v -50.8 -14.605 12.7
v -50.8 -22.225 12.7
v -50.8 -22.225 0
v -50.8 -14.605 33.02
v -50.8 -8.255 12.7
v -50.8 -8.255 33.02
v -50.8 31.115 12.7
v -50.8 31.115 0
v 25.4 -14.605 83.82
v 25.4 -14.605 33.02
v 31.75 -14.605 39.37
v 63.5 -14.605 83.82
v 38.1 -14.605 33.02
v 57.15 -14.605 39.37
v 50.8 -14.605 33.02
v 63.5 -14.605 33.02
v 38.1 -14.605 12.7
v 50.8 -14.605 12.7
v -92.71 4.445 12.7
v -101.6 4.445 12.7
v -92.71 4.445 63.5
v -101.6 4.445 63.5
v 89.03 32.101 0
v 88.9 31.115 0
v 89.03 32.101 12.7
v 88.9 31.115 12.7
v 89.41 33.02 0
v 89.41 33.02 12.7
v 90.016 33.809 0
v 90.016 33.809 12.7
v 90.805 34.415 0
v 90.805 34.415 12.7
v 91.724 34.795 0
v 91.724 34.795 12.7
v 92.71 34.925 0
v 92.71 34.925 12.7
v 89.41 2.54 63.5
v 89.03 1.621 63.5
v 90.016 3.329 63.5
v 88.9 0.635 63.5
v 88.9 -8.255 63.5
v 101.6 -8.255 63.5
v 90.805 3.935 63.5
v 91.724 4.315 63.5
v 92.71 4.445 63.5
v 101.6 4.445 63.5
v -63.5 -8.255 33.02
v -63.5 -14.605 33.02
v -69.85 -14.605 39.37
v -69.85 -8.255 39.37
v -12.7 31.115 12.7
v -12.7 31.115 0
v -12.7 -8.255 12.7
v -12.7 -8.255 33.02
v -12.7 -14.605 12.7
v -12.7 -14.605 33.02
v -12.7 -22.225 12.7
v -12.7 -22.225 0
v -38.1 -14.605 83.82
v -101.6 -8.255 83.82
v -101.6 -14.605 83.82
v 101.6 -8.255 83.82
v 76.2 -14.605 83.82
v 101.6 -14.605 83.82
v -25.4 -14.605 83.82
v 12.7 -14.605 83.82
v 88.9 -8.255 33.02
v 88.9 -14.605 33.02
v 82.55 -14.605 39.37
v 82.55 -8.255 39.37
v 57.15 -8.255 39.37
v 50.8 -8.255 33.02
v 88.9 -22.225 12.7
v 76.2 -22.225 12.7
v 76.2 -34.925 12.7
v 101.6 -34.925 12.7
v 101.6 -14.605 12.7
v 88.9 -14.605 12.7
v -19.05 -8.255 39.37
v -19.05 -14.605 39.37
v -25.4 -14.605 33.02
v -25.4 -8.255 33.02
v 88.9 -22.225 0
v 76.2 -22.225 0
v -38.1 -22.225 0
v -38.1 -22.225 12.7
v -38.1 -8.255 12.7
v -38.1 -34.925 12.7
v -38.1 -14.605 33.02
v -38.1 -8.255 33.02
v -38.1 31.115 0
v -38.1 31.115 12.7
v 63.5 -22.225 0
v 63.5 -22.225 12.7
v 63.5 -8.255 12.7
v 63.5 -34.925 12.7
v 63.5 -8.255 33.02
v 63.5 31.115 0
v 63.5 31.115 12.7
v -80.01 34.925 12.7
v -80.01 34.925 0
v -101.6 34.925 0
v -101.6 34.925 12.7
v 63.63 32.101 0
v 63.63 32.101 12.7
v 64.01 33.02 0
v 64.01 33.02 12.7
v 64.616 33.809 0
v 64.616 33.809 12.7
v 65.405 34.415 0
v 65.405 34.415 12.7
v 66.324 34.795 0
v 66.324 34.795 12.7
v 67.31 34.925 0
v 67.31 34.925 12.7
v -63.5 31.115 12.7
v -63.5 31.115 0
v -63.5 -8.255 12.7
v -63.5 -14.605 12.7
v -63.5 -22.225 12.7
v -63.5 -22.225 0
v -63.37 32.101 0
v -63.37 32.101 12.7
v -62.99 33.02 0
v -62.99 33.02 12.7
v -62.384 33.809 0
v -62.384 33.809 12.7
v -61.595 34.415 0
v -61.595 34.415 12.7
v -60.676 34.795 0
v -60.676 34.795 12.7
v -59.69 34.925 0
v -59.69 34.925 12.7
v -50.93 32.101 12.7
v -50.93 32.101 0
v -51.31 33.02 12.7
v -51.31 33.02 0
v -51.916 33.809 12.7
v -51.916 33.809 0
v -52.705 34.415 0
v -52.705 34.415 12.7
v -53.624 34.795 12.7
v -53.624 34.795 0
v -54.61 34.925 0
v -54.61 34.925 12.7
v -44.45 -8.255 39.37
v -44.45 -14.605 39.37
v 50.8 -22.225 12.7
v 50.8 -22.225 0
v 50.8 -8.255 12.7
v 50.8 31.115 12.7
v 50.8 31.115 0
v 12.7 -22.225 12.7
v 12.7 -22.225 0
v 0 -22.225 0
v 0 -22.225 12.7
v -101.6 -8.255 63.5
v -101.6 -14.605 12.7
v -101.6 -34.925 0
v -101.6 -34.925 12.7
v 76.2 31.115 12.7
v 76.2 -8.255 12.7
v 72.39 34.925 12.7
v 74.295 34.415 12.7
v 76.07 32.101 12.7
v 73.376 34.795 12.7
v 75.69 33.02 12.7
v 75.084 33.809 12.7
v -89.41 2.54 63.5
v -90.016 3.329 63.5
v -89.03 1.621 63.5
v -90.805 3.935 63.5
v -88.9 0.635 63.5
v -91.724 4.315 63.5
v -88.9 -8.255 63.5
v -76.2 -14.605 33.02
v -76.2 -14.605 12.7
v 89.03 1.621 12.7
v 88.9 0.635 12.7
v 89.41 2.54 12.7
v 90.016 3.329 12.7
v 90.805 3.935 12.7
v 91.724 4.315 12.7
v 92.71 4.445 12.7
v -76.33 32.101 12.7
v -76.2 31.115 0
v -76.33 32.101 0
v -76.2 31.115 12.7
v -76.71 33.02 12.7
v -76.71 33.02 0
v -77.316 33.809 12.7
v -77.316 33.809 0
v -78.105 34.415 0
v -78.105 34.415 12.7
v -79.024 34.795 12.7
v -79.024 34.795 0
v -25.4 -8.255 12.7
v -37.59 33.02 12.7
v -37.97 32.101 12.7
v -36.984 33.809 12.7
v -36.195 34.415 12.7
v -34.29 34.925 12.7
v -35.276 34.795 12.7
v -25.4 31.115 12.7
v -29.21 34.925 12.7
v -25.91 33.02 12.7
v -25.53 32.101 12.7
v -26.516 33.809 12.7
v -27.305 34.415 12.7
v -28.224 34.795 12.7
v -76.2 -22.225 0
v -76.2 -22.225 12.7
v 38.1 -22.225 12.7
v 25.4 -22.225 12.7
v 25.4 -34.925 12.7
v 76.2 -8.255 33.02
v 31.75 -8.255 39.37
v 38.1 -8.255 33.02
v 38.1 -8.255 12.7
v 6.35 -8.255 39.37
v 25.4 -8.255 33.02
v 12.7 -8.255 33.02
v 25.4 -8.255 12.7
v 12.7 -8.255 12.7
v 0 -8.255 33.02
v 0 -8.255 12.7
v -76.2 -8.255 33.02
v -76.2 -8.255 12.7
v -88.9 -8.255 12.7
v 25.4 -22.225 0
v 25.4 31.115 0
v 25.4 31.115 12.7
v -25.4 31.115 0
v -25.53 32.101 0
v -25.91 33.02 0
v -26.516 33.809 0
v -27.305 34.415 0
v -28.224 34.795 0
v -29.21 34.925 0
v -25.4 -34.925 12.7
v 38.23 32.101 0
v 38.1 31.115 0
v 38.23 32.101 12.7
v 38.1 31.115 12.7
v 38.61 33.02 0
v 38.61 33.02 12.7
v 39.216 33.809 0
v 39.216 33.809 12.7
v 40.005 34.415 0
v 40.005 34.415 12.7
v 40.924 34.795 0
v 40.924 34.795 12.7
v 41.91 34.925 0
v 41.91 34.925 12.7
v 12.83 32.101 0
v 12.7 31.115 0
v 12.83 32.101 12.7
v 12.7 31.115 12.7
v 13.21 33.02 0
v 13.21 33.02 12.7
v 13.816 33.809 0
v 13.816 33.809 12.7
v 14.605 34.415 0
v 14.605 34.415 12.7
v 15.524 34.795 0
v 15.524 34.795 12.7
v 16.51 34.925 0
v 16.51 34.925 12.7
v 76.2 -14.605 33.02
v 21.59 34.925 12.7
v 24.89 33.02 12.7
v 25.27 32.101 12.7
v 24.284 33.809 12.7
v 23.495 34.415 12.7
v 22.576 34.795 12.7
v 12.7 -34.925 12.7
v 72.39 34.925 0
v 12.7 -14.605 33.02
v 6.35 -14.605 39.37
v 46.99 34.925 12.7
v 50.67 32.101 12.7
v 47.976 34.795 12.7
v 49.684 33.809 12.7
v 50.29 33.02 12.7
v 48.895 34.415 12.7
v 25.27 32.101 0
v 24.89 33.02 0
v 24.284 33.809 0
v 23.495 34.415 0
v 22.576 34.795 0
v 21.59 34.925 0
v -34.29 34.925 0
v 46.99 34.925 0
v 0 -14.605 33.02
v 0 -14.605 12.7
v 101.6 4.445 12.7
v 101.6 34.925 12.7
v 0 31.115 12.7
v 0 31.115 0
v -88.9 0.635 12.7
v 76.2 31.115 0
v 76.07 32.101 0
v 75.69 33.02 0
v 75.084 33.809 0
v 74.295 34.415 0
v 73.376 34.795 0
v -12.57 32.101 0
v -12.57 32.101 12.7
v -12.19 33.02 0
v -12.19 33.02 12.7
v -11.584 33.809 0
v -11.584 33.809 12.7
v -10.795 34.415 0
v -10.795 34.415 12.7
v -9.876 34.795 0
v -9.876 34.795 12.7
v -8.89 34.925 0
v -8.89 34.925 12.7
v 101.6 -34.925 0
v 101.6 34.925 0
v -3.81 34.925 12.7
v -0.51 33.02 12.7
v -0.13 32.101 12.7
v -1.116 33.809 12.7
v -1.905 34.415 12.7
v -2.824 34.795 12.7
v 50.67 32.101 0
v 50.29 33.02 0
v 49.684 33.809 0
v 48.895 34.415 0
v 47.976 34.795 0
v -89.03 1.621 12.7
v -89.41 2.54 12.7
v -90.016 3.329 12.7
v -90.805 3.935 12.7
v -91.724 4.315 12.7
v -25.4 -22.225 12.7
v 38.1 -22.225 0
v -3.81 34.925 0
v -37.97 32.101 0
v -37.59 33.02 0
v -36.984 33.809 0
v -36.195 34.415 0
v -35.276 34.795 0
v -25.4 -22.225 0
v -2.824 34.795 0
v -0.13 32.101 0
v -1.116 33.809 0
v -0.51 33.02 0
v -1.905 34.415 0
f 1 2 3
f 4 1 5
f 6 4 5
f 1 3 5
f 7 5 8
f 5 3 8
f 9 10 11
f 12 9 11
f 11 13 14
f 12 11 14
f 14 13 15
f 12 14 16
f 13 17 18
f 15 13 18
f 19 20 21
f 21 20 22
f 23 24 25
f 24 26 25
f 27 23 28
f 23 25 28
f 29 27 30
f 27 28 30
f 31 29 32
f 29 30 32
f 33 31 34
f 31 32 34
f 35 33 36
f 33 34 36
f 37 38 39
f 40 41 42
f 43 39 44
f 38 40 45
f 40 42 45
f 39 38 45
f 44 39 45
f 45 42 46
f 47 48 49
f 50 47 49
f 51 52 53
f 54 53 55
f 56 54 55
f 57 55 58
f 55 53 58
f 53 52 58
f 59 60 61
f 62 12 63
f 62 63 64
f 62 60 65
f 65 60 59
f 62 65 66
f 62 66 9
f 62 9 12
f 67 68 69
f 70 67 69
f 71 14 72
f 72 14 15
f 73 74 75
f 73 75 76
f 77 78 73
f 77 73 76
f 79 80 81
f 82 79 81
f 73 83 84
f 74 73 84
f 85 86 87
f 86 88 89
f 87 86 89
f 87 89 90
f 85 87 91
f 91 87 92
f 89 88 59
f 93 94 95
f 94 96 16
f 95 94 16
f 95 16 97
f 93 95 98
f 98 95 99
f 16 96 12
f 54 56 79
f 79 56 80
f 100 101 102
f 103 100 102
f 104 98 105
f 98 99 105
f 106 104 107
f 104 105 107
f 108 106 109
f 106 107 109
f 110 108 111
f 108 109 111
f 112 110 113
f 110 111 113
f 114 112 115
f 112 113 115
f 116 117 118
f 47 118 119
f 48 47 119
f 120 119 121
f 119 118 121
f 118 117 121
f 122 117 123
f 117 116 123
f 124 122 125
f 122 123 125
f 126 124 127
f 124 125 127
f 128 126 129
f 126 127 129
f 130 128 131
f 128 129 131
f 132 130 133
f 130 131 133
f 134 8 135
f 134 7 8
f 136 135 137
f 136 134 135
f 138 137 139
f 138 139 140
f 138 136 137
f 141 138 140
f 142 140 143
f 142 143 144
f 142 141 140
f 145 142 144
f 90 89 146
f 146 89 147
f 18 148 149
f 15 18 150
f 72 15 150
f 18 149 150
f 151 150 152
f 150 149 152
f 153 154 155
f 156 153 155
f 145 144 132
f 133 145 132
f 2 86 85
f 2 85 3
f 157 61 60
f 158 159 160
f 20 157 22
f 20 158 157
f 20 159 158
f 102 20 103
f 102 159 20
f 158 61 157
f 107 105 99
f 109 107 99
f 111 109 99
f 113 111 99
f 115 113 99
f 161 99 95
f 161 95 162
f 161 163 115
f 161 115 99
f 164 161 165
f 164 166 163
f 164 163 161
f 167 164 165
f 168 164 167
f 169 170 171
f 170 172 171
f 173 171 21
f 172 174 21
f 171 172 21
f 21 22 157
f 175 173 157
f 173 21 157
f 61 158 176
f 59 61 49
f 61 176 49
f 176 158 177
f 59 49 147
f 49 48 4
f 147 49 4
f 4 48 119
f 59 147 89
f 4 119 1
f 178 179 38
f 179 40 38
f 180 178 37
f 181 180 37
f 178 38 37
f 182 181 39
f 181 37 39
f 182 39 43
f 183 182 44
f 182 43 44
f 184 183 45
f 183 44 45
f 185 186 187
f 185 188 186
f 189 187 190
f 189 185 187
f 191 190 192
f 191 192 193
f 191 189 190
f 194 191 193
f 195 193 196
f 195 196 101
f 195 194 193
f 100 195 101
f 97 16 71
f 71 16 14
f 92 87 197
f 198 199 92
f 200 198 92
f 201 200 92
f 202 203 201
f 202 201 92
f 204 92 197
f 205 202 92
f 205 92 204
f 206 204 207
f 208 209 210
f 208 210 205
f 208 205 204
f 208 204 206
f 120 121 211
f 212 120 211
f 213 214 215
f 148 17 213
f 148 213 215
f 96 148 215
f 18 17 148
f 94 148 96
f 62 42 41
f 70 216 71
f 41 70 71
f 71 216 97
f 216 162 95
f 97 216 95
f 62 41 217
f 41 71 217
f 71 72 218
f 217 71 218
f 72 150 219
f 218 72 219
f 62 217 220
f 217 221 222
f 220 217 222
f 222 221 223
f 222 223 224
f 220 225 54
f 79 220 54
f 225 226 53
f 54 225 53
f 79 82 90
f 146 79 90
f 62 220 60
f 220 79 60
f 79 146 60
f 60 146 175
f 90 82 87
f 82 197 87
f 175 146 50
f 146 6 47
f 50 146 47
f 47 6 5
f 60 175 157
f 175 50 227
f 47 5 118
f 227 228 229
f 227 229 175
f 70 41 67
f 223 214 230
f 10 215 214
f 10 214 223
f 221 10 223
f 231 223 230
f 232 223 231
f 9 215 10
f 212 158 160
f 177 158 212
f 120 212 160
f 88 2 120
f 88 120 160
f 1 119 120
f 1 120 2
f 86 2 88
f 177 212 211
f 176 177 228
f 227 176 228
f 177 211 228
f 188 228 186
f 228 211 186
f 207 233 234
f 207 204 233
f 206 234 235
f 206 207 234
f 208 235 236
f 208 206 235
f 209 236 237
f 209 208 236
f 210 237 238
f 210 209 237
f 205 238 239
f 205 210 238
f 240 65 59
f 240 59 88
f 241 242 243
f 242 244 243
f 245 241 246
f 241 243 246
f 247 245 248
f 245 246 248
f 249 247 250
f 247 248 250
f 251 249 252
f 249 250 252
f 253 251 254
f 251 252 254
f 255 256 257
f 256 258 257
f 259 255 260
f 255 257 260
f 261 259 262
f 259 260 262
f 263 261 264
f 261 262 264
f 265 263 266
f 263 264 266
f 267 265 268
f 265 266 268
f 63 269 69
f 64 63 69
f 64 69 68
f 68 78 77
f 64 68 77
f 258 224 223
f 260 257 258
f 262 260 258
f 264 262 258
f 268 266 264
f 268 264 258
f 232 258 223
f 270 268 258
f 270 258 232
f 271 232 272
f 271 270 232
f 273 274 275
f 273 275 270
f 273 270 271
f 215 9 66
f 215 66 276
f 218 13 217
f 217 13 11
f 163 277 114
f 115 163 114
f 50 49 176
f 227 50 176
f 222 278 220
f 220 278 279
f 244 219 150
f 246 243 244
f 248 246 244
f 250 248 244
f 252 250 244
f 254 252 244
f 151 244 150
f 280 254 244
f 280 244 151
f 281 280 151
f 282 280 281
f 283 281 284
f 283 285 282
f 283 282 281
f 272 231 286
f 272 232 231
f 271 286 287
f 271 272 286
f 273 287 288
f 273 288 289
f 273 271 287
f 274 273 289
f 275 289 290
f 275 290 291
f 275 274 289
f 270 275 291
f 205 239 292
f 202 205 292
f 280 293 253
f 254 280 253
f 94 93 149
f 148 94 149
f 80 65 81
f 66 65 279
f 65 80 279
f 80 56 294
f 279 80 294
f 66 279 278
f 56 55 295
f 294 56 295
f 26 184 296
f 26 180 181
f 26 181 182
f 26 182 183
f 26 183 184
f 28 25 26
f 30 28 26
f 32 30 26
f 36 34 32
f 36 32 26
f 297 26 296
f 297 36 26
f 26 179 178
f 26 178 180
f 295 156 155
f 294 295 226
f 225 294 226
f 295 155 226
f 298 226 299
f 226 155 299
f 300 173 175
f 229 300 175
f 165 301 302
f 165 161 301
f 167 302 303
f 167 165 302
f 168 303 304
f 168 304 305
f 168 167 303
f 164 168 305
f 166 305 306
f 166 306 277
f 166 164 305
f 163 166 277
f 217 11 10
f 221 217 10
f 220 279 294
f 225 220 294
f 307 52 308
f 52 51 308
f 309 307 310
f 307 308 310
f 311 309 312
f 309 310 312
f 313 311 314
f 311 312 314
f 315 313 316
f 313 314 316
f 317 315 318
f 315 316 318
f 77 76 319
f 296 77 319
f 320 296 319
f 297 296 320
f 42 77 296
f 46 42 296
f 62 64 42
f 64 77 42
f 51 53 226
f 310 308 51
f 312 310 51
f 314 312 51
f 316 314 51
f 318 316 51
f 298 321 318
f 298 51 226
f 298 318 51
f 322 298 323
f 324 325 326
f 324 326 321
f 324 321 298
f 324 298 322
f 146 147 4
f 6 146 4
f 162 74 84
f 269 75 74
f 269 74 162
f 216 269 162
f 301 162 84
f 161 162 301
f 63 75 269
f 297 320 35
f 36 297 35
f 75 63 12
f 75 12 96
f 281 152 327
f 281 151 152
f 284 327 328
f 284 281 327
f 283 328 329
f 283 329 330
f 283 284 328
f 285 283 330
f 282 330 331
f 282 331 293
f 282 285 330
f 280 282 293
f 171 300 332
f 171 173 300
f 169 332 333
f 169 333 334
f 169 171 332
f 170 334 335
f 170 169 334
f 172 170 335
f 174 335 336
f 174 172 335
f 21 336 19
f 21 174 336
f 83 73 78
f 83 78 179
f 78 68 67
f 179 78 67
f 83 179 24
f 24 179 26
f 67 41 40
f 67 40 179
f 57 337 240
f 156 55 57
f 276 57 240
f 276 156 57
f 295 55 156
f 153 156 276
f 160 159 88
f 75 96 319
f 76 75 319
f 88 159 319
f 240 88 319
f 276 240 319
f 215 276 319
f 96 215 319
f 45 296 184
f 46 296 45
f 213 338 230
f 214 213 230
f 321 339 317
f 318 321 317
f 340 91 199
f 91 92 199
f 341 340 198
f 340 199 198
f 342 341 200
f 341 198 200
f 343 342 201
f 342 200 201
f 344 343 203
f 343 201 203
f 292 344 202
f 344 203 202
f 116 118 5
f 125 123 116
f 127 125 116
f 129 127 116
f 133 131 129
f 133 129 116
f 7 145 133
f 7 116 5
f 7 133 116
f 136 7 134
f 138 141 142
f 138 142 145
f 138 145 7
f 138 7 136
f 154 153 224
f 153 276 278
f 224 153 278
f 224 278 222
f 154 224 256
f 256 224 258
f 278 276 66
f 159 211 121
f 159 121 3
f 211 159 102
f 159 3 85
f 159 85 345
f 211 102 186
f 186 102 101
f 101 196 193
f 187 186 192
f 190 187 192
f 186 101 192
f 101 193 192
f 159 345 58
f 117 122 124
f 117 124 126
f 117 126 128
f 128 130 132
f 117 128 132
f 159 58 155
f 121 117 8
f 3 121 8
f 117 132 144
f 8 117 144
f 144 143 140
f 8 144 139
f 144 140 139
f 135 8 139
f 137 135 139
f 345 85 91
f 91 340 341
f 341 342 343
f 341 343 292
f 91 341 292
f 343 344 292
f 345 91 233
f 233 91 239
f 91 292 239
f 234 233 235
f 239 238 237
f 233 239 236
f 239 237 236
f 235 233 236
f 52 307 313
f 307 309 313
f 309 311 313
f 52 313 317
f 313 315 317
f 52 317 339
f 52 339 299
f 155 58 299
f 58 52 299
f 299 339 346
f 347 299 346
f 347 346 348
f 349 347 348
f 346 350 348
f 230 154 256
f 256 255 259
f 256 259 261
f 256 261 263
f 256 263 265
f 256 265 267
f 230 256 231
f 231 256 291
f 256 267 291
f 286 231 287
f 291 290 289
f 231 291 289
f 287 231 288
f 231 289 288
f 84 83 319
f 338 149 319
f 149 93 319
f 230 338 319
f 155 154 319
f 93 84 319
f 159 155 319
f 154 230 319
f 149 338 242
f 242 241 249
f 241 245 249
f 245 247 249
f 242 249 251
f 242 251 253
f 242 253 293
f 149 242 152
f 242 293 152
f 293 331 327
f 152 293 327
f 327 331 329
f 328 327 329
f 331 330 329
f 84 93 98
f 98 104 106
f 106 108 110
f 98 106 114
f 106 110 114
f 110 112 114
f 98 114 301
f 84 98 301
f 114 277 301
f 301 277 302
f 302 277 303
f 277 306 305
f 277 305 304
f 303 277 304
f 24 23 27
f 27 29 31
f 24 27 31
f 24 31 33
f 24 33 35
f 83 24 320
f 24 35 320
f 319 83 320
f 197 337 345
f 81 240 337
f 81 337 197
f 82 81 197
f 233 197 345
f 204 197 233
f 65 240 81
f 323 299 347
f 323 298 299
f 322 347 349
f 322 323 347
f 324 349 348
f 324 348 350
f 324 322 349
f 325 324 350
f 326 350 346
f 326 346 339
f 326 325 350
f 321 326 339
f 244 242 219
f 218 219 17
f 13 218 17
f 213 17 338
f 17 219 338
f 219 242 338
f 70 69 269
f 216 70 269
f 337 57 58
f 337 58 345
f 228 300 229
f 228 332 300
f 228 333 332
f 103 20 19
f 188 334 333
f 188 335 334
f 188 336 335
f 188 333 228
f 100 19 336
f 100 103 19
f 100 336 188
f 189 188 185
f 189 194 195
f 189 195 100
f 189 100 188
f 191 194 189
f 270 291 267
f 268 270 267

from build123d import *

# Parameters (mm, degrees)
F0_W      = 12.7
F0_H      = 57.15
F1_DEPTH  = 12.7
F2_W      = 25.4
F2_H      = 6.35
F2_W_2    = 12.7
F3_DEPTH  = 20.32
F4_W      = 25.4
F4_H      = 6.35
F4_W_2    = 12.7
F5_DEPTH  = 50.8
F6_W      = 12.7
F6_H      = 50.8
F7_DEPTH  = 12.7
F9_DEPTH  = 12.7
F11_DEPTH = 12.7
F13_DEPTH = 12.7
F14_W     = 12.7
F14_H     = 50.8
F15_DEPTH = 12.7
F16_R     = 3.81
F18_DEPTH = 6.35
F19_R     = 3.81


# Not quite as in the source:
# - a feature names something its author has since deleted; it is built from what else it names


with BuildPart() as f1:
    # F0 (on Top) → F1 (new body)
    with BuildSketch(Plane.XY):
        Polygon((101.6, -34.925), (101.6, 34.925), (88.9, 34.925), (88.9, -22.225), (76.2, -22.225), (76.2, 34.925), (63.5, 34.925), (63.5, -22.225), (50.8, -22.225), (50.8, 34.925), (38.1, 34.925), (38.1, -22.225), (25.4, -22.225), (25.4, 34.925), (12.7, 34.925), (12.7, -22.225), (0, -22.225), (0, 34.925), (-12.7, 34.925), (-12.7, -22.225), (-25.4, -22.225), (-25.4, 34.925), (-38.1, 34.925), (-38.1, -22.225), (-50.8, -22.225), (-50.8, 34.925), (-63.5, 34.925), (-63.5, -22.225), (-76.2, -22.225), (-76.2, 34.925), (-88.9, 34.925), (-88.9, -22.225), (-101.6, -22.225), (-101.6, -34.925), align=None)
        with Locations((-95.25, 6.35)):
            Rectangle(F0_W, F0_H)
    extrude(amount=F1_DEPTH)

    # F2 (on face) → F3 (join)
    with BuildSketch(Plane.XY.offset(12.7)):
        with Locations((-88.9, -11.43)):
            Rectangle(F2_W, F2_H)
        with Locations((-31.75, -11.43)):
            Rectangle(F2_W_2, F2_H)
        with Locations((-6.35, -11.43)):
            Rectangle(F2_W_2, F2_H)
        with Locations((19.05, -11.43)):
            Rectangle(F2_W_2, F2_H)
        with Locations((44.45, -11.43)):
            Rectangle(F2_W_2, F2_H)
        with Locations((69.85, -11.43)):
            Rectangle(F2_W_2, F2_H)
        with Locations((95.25, -11.43)):
            Rectangle(F2_W_2, F2_H)
        with Locations((-57.15, -11.43)):
            Rectangle(F2_W_2, F2_H)
    extrude(amount=F3_DEPTH)

    # F4 (on face) → F5 (join)
    with BuildSketch(Plane.XY.offset(33.02)):
        with Locations((-88.9, -11.43)):
            Rectangle(F4_W, F4_H)
        with Locations((-69.85, -11.43)):
            Rectangle(F4_W_2, F4_H)
        with Locations((-57.15, -11.43)):
            Rectangle(F4_W_2, F4_H)
        with Locations((-44.45, -11.43)):
            Rectangle(F4_W_2, F4_H)
        with Locations((-31.75, -11.43)):
            Rectangle(F4_W_2, F4_H)
        with Locations((-19.05, -11.43)):
            Rectangle(F4_W_2, F4_H)
        with Locations((-6.35, -11.43)):
            Rectangle(F4_W_2, F4_H)
        with Locations((6.35, -11.43)):
            Rectangle(F4_W_2, F4_H)
        with Locations((19.05, -11.43)):
            Rectangle(F4_W_2, F4_H)
        with Locations((31.75, -11.43)):
            Rectangle(F4_W_2, F4_H)
        with Locations((44.45, -11.43)):
            Rectangle(F4_W_2, F4_H)
        with Locations((57.15, -11.43)):
            Rectangle(F4_W_2, F4_H)
        with Locations((69.85, -11.43)):
            Rectangle(F4_W_2, F4_H)
        with Locations((82.55, -11.43)):
            Rectangle(F4_W_2, F4_H)
        with Locations((95.25, -11.43)):
            Rectangle(F4_W_2, F4_H)
    extrude(amount=F5_DEPTH)

    # F6 (on face) → F7 (join)
    with BuildSketch(Plane(origin=(-101.6, 0, 0), x_dir=(0, -1, 0), z_dir=(-1, 0, 0))):
        Polygon((8.255, 63.5), (8.255, 12.7), (-4.445, 12.7), (-34.925, 12.7), (-34.925, 0), (34.925, 0), (34.925, 12.7), (14.605, 12.7), (14.605, 83.82), (8.255, 83.82), align=None)
        with Locations((1.905, 38.1)):
            Rectangle(F6_W, F6_H)
    extrude(amount=-F7_DEPTH)

    # F8 (on face) → F9 (join, through all)
    with BuildSketch(Plane.YZ.offset(-25.4)):
        Polygon((-14.605, 33.02), (-14.605, 83.82), (-34.925, 12.7), (-22.225, 12.7), (-14.605, 12.7), align=None)
    extrude(amount=-F9_DEPTH)

    # F10 (on face) → F11 (join, through all)
    with BuildSketch(Plane.YZ.offset(25.4)):
        Polygon((-14.605, 33.02), (-14.605, 83.82), (-34.925, 12.7), (-22.225, 12.7), (-14.605, 12.7), align=None)
    extrude(amount=-F11_DEPTH)

    # F12 (on face) → F13 (join, through all)
    with BuildSketch(Plane.YZ.offset(76.2)):
        Polygon((-14.605, 33.02), (-14.605, 83.82), (-34.925, 12.7), (-22.225, 12.7), (-14.605, 12.7), align=None)
    extrude(amount=-F13_DEPTH)

    # F14 (on face) → F15 (join, through all)
    with BuildSketch(Plane.YZ.offset(101.6)):
        with Locations((-1.905, 38.1)):
            Rectangle(F14_W, F14_H)
    extrude(amount=-F15_DEPTH)

    # F16
    f16_edges = [f1.edges().sort_by_distance(p)[0] for p in [
        (88.9, 34.925, 6.35),
        (63.5, 34.925, 6.35),
        (38.1, 34.925, 6.35),
        (12.7, 34.925, 6.35),
        (-12.7, 34.925, 6.35),
        (-38.1, 34.925, 6.35),
        (76.2, 34.925, 6.35),
        (50.8, 34.925, 6.35),
        (25.4, 34.925, 6.35),
        (0, 34.925, 6.35),
        (-25.4, 34.925, 6.35),
        (-50.8, 34.925, 6.35),
        (-76.2, 34.925, 6.35),
        (-63.5, 34.925, 6.35),
    ]]
    fillet(f16_edges, radius=F16_R)

    # F17 (on face) → F18 (cut, through all)
    with BuildSketch(Plane.XZ.offset(14.605)):
        Polygon((-44.45, 39.37), (-50.8, 33.02), (-38.1, 33.02), align=None)
        Polygon((-25.4, 33.02), (-12.7, 33.02), (-19.05, 39.37), align=None)
        Polygon((6.35, 39.37), (0, 33.02), (12.7, 33.02), align=None)
        Polygon((31.75, 39.37), (25.4, 33.02), (38.1, 33.02), align=None)
        Polygon((57.15, 39.37), (50.8, 33.02), (63.5, 33.02), align=None)
        Polygon((76.2, 33.02), (88.9, 33.02), (82.55, 39.37), align=None)
        Polygon((-76.2, 33.02), (-63.5, 33.02), (-69.85, 39.37), align=None)
    extrude(amount=-F18_DEPTH, mode=Mode.SUBTRACT)

    # F19
    f19_edges = [f1.edges().sort_by_distance(p)[0] for p in [
        (-88.9, 4.445, 38.1),
        (88.9, 4.445, 38.1),
    ]]
    fillet(f19_edges, radius=F19_R)


solid = f1.part
